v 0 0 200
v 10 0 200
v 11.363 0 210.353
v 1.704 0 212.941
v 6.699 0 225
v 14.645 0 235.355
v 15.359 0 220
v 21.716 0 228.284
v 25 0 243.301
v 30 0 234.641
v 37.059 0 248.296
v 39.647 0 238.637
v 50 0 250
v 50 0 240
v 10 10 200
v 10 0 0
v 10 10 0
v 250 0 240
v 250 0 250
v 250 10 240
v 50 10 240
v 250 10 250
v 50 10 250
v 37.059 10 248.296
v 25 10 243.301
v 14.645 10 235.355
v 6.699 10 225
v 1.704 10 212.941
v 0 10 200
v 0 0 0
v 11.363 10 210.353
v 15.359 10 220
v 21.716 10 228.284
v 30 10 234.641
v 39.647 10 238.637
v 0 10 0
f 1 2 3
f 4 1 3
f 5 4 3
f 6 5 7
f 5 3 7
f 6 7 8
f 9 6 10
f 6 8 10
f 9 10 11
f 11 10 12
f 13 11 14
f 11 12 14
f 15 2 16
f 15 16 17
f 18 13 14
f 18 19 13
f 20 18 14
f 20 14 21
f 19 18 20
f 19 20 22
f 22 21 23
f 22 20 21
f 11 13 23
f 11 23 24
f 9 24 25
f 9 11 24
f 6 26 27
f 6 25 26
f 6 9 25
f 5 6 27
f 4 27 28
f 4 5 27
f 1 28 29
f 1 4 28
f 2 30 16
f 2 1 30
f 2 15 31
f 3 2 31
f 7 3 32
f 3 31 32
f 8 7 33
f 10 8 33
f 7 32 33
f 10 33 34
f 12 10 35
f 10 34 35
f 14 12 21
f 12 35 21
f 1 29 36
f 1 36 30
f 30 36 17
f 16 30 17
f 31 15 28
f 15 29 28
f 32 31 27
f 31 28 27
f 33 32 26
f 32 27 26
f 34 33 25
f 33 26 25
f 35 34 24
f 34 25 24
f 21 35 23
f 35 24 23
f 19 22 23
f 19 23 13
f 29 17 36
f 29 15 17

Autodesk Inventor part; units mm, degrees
ref_plane "YZ Plane" through (0, 0, 0) normal (1, 0, 0) x (0, 1, 0)
ref_plane "XZ Plane" through (0, 0, 0) normal (0, 1, 0) x (-1, 0, 0)
ref_plane "XY Plane" through (0, 0, 0) normal (0, 0, 1) x (1, 0, 0)
sketch "Эскиз1" plane through (0, 0, 0) normal (0, 0, 1) x (1, 0, 0)
  line L0 (0, 0) -> (10, 0)
  line L1 (10, 0) -> (10, 10)
  line L2 (10, 10) -> (0, 10)
  line L3 (0, 10) -> (0, 0)
  dimension "d5" = 10
  dimension "d6" = 10
sketch "Эскиз2" plane through (0, 0, 0) normal (0, 1, 0) x (-1, 0, 0)
  line L0 (0, 0) -> (0, 200)
  line L1 (-50, 250) -> (-250, 250)
  arc A0 (0, 200) -> (-50, 250) centre (-50, 200) ccw
  point P0 (0, 250)
  dimension "d3" = 250
  dimension "d4" = 250
  dimension "d7" = 50
sweep "Сдвиг1" add profiles "Эскиз1" path "Эскиз2"
properties part number "4"
